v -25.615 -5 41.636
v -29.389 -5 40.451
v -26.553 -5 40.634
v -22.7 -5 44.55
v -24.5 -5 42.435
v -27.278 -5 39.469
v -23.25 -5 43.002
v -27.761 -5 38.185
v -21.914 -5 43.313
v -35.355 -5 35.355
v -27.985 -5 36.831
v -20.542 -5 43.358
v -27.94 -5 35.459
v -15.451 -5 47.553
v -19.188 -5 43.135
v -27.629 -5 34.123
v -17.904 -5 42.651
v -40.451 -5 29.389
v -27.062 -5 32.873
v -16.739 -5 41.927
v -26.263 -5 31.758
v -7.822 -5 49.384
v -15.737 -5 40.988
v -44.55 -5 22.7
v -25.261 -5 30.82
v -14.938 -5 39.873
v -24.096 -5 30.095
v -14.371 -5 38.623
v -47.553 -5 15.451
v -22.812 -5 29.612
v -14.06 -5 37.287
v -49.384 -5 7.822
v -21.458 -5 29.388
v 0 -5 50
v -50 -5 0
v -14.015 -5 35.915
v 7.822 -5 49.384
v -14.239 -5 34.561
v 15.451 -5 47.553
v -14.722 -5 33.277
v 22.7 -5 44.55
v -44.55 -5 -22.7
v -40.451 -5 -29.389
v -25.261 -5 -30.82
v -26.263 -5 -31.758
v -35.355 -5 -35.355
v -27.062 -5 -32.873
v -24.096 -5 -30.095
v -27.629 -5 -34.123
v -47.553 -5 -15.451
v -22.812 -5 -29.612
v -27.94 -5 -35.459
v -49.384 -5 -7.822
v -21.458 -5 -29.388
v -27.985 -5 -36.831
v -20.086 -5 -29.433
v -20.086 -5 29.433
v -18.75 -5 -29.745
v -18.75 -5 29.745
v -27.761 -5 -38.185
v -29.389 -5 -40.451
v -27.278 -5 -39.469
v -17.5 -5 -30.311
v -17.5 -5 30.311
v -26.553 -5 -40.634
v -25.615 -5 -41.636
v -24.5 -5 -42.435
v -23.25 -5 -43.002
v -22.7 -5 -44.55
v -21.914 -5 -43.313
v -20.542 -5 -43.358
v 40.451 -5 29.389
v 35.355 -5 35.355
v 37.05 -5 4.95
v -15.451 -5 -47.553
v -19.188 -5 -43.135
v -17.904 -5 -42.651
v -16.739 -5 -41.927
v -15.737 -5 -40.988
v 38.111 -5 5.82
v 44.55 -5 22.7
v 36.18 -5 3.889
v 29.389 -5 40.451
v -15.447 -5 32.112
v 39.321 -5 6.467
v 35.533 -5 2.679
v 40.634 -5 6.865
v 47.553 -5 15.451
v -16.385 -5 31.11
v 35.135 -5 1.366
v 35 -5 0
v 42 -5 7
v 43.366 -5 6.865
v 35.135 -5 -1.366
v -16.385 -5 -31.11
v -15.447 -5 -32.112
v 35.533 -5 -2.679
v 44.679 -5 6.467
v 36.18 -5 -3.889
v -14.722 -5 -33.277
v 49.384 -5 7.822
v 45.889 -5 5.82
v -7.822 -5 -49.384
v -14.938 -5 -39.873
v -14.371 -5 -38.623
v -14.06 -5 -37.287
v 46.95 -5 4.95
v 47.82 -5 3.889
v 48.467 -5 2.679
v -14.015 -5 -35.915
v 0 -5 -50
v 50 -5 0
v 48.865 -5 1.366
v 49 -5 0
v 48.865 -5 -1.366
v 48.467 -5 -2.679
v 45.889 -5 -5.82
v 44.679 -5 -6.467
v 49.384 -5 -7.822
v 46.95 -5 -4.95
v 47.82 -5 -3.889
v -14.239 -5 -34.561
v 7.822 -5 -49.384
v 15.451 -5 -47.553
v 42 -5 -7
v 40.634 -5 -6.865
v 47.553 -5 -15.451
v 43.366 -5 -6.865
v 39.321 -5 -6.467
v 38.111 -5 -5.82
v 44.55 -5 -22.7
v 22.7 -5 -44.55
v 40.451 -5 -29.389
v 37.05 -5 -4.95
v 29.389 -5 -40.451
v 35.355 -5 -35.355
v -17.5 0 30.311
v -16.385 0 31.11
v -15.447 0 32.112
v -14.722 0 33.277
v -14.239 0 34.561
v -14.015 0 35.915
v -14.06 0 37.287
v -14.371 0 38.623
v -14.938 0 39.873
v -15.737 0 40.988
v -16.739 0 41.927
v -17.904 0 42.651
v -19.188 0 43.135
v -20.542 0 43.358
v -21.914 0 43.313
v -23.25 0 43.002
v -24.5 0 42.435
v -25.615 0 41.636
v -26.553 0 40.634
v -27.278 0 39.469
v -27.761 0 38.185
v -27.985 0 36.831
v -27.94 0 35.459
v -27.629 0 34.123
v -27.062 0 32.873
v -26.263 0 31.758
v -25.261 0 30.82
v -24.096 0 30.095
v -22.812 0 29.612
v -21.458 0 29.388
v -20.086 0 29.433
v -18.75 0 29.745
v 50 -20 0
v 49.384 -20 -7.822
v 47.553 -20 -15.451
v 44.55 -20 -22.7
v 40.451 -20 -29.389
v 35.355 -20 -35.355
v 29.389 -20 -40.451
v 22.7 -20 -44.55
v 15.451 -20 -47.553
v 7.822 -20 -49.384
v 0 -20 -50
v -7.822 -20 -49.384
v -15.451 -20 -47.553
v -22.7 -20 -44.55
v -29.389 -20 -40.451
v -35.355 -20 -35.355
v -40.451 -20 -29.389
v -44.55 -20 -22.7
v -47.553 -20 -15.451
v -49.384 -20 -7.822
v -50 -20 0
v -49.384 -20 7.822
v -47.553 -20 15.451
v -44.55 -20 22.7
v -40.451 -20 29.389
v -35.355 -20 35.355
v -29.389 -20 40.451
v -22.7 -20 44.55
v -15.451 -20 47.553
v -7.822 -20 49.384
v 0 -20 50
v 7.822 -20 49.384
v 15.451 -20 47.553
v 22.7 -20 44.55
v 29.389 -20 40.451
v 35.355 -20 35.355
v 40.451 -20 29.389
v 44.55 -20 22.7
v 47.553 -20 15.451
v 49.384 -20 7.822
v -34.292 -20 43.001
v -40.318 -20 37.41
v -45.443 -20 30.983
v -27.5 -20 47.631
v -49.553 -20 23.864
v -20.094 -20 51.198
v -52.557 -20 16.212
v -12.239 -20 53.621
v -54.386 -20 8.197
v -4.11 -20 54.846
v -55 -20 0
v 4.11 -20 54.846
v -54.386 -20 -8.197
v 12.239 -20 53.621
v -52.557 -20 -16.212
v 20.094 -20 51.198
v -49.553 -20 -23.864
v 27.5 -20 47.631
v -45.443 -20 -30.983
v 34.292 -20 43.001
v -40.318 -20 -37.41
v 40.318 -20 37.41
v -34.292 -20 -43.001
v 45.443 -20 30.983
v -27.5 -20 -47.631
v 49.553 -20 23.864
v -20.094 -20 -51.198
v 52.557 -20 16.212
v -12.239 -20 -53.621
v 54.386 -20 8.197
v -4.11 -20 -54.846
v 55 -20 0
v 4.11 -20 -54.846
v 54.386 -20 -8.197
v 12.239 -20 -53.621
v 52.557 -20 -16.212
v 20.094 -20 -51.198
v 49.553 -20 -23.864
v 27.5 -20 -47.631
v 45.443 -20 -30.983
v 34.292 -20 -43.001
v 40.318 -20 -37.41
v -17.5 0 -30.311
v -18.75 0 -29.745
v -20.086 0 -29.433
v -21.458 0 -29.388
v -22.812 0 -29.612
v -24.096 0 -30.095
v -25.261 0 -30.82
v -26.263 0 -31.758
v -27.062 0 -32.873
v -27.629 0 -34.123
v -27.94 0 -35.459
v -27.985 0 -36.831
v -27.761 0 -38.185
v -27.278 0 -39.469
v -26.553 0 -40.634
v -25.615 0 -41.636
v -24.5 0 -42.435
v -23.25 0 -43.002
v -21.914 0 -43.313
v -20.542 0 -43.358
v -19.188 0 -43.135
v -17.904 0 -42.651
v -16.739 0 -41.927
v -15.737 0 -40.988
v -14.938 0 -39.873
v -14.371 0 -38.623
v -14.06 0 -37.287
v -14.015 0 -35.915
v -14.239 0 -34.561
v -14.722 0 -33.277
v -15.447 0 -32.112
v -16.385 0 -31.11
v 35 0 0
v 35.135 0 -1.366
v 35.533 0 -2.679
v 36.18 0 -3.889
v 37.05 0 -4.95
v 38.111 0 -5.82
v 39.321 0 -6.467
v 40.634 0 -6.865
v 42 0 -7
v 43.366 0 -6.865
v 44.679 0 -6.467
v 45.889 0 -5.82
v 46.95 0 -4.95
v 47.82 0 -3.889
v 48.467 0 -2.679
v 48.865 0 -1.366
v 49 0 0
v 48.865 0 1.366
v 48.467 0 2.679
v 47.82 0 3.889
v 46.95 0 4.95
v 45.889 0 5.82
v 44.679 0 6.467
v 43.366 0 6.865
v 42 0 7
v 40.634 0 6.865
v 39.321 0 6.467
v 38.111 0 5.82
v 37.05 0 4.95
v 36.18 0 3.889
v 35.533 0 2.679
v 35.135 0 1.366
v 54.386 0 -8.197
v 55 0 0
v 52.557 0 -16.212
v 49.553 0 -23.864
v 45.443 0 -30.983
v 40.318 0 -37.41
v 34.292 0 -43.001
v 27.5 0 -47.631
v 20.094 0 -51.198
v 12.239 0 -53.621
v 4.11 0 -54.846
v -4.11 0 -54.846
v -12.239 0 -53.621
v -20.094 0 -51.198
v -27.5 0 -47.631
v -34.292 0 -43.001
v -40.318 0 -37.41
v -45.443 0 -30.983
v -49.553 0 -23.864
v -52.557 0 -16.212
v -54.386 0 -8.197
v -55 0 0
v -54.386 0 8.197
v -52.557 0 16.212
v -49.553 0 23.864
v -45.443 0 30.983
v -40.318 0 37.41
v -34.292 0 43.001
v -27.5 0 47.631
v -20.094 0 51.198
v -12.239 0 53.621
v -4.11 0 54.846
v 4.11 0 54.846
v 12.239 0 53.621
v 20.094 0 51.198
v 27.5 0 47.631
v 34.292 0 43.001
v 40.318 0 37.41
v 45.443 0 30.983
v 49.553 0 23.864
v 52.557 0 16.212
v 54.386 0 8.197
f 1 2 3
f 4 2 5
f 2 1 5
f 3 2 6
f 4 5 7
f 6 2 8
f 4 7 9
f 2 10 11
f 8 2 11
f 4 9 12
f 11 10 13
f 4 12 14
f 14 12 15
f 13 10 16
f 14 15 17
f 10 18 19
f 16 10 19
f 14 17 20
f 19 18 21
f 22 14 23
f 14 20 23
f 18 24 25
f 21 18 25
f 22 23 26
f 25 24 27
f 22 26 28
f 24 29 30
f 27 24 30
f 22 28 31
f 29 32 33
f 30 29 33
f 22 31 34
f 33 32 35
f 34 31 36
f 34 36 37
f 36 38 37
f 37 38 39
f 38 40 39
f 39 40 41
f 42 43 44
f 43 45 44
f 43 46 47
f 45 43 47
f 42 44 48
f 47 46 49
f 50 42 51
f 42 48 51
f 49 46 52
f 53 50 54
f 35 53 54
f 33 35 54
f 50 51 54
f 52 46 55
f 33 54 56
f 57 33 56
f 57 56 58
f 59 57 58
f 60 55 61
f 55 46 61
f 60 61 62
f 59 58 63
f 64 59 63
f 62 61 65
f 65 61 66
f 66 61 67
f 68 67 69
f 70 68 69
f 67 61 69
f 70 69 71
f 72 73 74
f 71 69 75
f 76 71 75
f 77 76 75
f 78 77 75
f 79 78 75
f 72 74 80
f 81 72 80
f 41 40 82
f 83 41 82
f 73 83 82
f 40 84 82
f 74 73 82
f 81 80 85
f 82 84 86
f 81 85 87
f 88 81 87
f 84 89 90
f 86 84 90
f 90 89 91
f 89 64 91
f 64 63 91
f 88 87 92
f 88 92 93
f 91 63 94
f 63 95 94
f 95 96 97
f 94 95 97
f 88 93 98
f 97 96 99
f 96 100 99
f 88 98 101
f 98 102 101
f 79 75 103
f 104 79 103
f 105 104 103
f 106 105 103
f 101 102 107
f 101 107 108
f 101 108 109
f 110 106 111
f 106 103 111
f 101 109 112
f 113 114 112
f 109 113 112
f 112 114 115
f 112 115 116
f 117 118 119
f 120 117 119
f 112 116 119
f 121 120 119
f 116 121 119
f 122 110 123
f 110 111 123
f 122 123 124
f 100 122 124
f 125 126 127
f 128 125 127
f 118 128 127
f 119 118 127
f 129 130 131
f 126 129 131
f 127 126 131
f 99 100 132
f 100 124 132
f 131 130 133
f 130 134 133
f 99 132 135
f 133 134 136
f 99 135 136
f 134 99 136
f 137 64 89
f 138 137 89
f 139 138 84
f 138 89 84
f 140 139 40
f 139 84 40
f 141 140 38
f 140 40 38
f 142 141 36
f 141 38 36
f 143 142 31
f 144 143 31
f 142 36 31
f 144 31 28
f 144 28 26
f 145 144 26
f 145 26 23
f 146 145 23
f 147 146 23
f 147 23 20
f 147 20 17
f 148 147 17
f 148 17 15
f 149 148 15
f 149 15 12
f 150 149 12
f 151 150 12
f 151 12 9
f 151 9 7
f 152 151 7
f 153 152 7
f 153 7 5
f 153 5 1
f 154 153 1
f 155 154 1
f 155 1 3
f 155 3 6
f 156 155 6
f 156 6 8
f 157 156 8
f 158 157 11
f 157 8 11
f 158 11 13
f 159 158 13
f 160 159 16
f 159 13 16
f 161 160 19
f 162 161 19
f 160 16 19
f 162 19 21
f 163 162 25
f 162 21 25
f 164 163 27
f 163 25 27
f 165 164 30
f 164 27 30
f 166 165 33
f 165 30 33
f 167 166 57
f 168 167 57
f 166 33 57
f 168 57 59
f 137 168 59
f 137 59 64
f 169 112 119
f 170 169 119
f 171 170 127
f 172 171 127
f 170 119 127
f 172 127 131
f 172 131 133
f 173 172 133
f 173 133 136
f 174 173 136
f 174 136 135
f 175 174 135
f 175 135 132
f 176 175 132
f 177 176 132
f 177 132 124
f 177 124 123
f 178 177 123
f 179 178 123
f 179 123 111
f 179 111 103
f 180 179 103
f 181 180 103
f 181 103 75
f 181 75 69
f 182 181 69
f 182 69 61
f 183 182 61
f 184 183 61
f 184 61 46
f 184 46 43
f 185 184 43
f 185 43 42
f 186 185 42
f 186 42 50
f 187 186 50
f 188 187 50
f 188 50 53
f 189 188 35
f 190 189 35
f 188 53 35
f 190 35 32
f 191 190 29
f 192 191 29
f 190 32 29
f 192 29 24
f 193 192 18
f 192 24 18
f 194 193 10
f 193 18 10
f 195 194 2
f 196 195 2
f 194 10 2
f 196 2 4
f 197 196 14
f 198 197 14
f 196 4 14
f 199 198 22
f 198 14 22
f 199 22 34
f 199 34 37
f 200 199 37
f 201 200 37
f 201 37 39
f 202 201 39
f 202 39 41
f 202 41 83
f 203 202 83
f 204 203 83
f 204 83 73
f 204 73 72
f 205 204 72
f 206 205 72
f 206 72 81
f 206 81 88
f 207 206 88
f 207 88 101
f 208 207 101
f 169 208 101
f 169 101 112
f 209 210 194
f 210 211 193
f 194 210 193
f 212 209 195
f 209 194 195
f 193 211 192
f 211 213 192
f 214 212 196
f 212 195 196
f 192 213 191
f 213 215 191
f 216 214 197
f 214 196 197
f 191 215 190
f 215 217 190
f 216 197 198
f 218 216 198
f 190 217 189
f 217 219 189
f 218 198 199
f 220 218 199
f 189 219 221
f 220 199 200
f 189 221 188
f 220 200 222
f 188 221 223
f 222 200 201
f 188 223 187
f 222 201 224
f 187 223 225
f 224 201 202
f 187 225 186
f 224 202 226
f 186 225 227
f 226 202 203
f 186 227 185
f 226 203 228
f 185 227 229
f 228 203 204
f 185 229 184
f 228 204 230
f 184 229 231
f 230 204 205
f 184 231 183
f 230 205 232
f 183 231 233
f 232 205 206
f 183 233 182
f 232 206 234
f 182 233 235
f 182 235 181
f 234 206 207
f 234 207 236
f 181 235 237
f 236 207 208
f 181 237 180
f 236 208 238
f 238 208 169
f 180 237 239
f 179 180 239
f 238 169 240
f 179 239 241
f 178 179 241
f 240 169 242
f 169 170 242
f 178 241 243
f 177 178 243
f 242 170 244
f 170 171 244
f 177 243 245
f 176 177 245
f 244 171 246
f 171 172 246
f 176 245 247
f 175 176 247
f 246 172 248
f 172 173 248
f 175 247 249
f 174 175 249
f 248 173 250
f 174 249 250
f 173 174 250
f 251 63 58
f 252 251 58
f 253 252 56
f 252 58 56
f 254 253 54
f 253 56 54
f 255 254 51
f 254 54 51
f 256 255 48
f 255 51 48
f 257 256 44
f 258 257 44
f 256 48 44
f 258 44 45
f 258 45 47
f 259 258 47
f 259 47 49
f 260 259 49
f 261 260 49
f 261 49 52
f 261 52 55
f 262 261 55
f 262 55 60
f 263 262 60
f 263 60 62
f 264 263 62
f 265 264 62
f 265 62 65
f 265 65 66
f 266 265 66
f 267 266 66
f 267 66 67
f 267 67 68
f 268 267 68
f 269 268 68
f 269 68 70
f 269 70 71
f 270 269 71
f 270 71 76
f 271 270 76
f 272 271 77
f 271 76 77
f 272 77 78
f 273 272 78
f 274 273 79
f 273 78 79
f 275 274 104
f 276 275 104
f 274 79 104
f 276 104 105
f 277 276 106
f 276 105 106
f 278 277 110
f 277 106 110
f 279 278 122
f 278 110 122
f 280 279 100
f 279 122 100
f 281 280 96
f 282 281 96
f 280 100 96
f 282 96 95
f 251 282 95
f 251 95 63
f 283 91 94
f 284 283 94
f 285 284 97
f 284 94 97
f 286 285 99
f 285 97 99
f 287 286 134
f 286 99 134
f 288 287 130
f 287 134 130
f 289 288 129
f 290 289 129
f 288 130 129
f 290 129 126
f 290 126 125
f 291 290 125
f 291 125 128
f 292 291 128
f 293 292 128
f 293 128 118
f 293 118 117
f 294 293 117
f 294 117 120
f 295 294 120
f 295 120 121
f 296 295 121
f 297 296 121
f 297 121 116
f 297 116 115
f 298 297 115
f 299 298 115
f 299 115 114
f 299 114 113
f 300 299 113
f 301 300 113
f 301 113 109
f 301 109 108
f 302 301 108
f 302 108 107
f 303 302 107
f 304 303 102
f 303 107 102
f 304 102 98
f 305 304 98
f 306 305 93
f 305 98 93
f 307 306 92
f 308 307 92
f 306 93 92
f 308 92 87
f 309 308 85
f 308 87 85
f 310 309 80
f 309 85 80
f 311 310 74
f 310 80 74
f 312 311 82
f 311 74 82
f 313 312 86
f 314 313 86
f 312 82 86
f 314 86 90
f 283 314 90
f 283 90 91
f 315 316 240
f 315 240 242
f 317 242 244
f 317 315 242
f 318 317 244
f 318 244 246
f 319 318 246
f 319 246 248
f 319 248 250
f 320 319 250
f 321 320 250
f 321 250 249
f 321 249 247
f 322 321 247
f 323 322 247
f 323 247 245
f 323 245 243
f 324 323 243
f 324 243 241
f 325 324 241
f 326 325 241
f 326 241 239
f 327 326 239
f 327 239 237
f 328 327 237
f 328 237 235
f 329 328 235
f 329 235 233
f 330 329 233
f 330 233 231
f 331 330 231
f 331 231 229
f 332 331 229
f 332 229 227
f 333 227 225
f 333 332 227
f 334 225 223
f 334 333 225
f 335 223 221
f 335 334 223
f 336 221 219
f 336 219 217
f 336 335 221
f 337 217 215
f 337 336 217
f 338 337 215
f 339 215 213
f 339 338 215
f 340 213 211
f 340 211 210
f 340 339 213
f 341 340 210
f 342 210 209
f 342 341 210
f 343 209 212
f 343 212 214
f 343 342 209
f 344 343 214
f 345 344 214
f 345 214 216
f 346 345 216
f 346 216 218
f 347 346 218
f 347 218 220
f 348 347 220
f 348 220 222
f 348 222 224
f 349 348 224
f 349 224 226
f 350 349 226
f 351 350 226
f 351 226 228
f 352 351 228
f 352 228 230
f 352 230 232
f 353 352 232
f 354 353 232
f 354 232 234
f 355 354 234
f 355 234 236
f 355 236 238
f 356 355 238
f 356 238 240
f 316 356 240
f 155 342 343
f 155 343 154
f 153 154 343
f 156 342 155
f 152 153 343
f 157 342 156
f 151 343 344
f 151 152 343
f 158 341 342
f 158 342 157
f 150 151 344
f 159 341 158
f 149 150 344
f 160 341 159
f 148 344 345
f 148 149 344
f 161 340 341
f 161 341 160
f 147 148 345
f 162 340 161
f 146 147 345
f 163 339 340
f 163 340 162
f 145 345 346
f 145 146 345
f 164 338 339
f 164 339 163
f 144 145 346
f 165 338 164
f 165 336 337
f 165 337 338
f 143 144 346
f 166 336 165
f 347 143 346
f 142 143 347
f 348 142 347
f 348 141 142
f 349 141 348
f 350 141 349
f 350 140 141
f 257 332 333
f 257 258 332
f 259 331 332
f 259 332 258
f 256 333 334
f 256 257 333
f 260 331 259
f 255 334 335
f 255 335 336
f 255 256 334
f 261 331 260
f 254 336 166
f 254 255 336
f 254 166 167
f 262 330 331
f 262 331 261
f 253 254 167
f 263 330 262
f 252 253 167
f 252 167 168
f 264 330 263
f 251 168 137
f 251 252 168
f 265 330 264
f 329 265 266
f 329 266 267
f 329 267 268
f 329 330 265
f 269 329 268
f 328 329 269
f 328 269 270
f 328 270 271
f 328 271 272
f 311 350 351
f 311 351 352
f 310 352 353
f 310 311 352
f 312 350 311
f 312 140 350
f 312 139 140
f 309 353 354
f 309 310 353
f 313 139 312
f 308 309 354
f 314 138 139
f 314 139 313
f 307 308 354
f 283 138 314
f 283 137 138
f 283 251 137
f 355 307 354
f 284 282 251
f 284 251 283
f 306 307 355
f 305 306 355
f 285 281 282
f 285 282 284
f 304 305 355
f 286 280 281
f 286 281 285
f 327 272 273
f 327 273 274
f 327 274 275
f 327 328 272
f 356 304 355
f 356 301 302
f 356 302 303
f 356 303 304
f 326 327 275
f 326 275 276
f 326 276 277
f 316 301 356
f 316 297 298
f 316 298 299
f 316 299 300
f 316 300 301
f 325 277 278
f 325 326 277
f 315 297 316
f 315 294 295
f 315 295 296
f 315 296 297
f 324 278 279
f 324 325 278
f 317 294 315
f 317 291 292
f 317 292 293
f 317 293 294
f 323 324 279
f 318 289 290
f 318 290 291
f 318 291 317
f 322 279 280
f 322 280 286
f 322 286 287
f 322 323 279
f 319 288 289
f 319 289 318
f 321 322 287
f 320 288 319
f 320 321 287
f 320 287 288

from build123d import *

# Parameters (mm, degrees)
SKETCH2_R                    = 55
SKETCH2_R_2                  = 50
BOSS_EXTRUDE1_DEPTH          = 20
SKETCH3_R                    = 55
BOSS_EXTRUDE2_DEPTH          = 5
TAP_DRILL_FOR_M14X2_0_TAP1_D = 14
CIRPATTERN1_COUNT            = 3


with BuildPart() as part:
    # Sketch2 → Boss-Extrude1 (new body)
    with BuildSketch(Plane(origin=(0, 0, 0), x_dir=(1, 0, 0), z_dir=(0, 1, 0))):
        Circle(SKETCH2_R)
        Circle(SKETCH2_R_2, mode=Mode.SUBTRACT)
    extrude(amount=-BOSS_EXTRUDE1_DEPTH)

    # Sketch3 → Boss-Extrude2 (add)
    with BuildSketch(Plane(origin=(0, 0, 0), x_dir=(1, 0, 0), z_dir=(0, 1, 0))):
        Circle(SKETCH3_R)
    extrude(amount=-BOSS_EXTRUDE2_DEPTH)

    # Tap Drill for M14x2.0 Tap1 (through all)
    with Locations(Plane(origin=(0, 0, 0), x_dir=(1, 0, 0), z_dir=(0, 1, 0))):
        with Locations((42, 0)):
            tap_drill_for_m14x2_0_tap1 = Hole(TAP_DRILL_FOR_M14X2_0_TAP1_D / 2)

    # CirPattern1: Tap Drill for M14x2.0 Tap1 ×3 about axis
    cirpattern1_axis = Axis((0, -21, 0), (0, 1, 0))
    for i in range(1, CIRPATTERN1_COUNT):
        add(tap_drill_for_m14x2_0_tap1.rotate(cirpattern1_axis, i * 360 / CIRPATTERN1_COUNT), mode=Mode.SUBTRACT)


solid = part.part
